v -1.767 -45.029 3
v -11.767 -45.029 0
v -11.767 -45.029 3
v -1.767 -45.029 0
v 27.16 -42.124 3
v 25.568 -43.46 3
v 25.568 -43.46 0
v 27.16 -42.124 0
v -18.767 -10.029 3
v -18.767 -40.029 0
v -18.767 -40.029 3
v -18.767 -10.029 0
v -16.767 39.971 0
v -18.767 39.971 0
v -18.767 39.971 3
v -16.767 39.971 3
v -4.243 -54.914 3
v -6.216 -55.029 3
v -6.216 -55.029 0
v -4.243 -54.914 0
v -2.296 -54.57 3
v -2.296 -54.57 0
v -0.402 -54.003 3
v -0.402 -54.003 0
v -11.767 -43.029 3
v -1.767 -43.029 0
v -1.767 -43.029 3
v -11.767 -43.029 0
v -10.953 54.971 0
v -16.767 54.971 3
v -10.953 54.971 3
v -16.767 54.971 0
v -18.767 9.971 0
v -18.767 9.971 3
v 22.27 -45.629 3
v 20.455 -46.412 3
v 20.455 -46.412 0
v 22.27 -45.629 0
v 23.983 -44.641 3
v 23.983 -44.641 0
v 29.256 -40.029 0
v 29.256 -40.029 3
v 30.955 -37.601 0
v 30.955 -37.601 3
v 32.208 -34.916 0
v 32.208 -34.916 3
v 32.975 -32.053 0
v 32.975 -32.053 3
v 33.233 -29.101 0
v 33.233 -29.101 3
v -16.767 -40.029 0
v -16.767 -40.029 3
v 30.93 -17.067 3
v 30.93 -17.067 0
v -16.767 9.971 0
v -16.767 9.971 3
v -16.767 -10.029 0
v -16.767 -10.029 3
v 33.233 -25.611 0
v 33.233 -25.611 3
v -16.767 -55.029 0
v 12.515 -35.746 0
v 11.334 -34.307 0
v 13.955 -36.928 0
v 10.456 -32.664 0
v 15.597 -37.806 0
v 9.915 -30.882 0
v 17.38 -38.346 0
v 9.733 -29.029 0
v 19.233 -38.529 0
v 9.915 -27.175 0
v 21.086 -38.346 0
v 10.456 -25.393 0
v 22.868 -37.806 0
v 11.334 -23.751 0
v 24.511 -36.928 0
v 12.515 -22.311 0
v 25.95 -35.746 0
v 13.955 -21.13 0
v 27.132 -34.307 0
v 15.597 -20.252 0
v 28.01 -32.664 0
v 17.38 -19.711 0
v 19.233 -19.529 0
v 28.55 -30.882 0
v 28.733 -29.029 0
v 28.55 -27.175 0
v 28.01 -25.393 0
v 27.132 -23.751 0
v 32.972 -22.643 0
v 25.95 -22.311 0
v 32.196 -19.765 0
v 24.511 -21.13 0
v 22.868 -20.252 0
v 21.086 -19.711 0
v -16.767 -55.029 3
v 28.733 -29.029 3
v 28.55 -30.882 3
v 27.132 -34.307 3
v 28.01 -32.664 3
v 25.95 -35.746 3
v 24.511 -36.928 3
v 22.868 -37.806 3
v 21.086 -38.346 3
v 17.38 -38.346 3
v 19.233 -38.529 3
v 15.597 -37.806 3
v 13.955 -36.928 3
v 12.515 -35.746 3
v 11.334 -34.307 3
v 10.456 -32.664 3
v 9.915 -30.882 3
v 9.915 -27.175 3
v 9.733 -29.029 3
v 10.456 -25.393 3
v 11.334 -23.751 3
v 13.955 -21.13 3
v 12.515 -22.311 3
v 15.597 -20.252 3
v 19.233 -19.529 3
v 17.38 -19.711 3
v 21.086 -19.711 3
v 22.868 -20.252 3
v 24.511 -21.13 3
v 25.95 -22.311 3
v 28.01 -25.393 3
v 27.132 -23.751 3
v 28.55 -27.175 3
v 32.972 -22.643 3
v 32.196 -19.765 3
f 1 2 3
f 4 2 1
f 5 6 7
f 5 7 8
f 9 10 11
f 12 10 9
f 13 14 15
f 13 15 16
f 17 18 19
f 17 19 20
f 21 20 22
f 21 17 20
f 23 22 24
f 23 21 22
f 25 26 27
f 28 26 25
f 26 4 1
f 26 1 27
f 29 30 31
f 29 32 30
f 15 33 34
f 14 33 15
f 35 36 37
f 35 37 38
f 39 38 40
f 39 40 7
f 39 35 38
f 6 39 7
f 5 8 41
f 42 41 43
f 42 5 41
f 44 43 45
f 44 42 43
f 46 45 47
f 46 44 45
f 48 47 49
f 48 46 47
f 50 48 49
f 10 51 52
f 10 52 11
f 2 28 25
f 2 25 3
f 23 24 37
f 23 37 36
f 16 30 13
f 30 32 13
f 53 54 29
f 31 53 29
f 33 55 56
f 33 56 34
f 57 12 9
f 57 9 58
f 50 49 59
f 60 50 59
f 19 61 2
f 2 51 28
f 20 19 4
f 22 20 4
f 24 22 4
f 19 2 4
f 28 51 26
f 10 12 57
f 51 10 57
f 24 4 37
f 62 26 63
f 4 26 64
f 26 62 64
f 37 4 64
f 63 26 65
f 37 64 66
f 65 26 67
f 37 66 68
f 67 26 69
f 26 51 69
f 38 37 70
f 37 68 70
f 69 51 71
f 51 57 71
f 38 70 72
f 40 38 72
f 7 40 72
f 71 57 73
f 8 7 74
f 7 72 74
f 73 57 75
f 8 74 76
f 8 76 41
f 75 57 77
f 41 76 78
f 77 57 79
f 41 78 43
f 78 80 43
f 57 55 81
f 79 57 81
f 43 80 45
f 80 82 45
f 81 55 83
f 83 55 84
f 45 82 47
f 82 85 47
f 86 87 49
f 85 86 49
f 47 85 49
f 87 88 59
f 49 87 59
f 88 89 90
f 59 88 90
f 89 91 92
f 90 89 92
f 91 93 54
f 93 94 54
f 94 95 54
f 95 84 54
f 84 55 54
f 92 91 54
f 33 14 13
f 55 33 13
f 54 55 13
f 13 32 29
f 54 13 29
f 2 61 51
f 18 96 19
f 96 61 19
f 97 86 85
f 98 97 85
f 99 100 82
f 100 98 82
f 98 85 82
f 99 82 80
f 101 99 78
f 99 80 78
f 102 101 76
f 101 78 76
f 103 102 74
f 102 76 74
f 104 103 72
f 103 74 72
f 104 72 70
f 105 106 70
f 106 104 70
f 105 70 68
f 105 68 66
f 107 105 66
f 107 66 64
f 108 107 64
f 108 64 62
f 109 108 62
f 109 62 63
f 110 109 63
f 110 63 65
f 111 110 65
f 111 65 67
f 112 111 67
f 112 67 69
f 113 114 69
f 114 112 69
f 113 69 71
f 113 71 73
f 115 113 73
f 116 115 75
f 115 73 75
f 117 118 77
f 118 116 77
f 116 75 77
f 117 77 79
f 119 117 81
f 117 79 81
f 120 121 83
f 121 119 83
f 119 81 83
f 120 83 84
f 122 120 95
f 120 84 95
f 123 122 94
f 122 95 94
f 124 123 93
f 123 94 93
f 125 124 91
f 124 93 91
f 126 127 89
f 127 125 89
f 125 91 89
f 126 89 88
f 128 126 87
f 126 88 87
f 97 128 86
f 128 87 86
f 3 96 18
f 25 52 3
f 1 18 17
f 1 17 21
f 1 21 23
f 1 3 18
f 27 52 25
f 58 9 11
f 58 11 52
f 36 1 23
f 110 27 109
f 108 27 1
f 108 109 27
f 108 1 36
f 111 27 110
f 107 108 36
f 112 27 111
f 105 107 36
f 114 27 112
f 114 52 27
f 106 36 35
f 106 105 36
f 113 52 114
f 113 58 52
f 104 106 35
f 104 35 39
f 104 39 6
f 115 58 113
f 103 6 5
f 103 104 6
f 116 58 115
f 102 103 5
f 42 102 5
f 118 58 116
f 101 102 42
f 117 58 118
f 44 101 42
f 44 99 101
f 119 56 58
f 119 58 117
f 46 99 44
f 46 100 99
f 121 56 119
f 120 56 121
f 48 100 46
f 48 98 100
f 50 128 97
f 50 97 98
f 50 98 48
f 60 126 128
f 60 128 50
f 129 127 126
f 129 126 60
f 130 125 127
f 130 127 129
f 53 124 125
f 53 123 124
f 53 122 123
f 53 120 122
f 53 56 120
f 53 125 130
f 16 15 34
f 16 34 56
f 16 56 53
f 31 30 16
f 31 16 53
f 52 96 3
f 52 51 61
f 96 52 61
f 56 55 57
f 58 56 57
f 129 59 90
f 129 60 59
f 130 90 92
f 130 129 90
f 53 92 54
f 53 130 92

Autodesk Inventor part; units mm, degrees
ref_plane "YZ Plane" through (0, 0, 0) normal (1, 0, 0) x (0, 1, 0)
ref_plane "XZ Plane" through (0, 0, 0) normal (0, 1, 0) x (-1, 0, 0)
ref_plane "XY Plane" through (0, 0, 0) normal (0, 0, 1) x (1, 0, 0)
sketch "Sketch1" plane through (0, 0, 0) normal (0, 0, 1) x (1, 0, 0)
  line L0 (-16.7671, 64.9713) -> (-16.7671, -55.0287)
  line L1 (-16.7671, -55.0287) -> (11.7813, -55.0287)
  line L2 (11.7813, -55.0287) -> (33.2329, -37.0287)
  line L3 (33.2329, -37.0287) -> (33.2329, -21.0287)
  line L4 (33.2329, -21.0287) -> (-16.7671, 64.9713)
  line L5 (-1.7671, -43.0287) -> (-11.7671, -43.0287)
  line L6 (-11.7671, -43.0287) -> (-11.7671, -45.0287)
  line L7 (-11.7671, -45.0287) -> (-1.7671, -45.0287)
  line L8 (-1.7671, -45.0287) -> (-1.7671, -43.0287)
  line L9 (-16.7671, -40.0287) -> (-18.7671, -40.0287)
  line L10 (-18.7671, -40.0287) -> (-18.7671, -10.0287)
  line L11 (-18.7671, -10.0287) -> (-16.7671, -10.0287)
  line L12 (-16.7671, -10.0287) -> (-16.7671, -40.0287)
  line L13 (-16.7671, 9.9713) -> (-18.7671, 9.9713)
  line L14 (-18.7671, 9.9713) -> (-18.7671, 39.9713)
  line L15 (-18.7671, 39.9713) -> (-16.7671, 39.9713)
  line L16 (-16.7671, 39.9713) -> (-16.7671, 9.9713)
  line L17 (-16.7671, 54.9713) -> (-10.9532, 54.9713)
  circle A0 centre (19.2329, -29.0287) radius 9.5
  line L18 (19.2329, -29.0287) -> (33.2329, -29.0287)
  point P0 (0, 0)
  point P1 (-17.7671, -40.0287)
  point P2 (-17.7671, -10.0287)
  dimension "d0" = 120
  dimension "d1" = 10
  dimension "d2" = 2
  dimension "d3" = 10
  dimension "d4" = 5
  dimension "d5" = 2
  dimension "d6" = 30
  dimension "d7" = 15
  dimension "d8" = 2
  dimension "d9" = 30
  dimension "d10" = 20
  dimension "d11" = 18
  dimension "d12" = 16
  dimension "d13" = 50
  dimension "d14" = 10
  dimension "d15" = 50
  dimension "d16" = 19
  dimension "d17" = 36
  dimension "d18" = 90
extrude "Plate1" add sketch "Sketch1" along normal blind 3 contours L17 L4 L3 L2 L1 L0 | L0 L13 L14 L15 | L0 L9 L10 L11
chamfer "Corner Chamfer1" distance 15 angle 45 1 edges at (11.7813, -55.0287, 1.5)
fillet "Corner Round1" radius 17 4 edges at (33.2329, -37.0287, 1.5) (33.2329, -21.0287, 1.5) (23.272, -45.3869, 1.5) (-3.2187, -55.0287, 1.5)
equation "\"d2\" = d19"
equation "\"d5\" = d19"
equation "\"d8\" = d19"
equation "\"d21\" = Thickness"
equation "\"Thickness\" = plate_thickness"
equation "\"BendRadius\" = Thickness"
equation "\"BendReliefWidth\" = Thickness"
equation "\"BendReliefDepth\" = 0.5 * Thickness"
equation "\"CornerReliefSize\" = 4 * Thickness"
equation "\"MinimumRemnant\" = 2 * Thickness"
equation "\"TransitionRadius\" = BendRadius"
equation "\"JacobiRadiusSize\" = BendRadius"
equation "\"GapSize\" = Thickness"
equation "\"A_width\" = 46"
equation "\"A_joint_diameter\" = 16"
equation "\"A_joint_tolerance\" = 3"
equation "\"l___________\" = 0"
equation "\"l__________\" = 0"
equation "\"l_________\" = 0"
equation "\"rivet_diameter\" = 3.35"
equation "\"plate_thickness\" = 3"
equation "\"l________\" = 0"
equation "\"L_Piston_Top\" = 25"
equation "\"L_Piston_Bottom\" = 21"
equation "\"A_B_spacing\" = 2"
equation "\"thin_plate\" = 1.5"
equation "\"d19\" = 2"
properties part number "Piston_FloorHinge01" material "Stainless Steel"
